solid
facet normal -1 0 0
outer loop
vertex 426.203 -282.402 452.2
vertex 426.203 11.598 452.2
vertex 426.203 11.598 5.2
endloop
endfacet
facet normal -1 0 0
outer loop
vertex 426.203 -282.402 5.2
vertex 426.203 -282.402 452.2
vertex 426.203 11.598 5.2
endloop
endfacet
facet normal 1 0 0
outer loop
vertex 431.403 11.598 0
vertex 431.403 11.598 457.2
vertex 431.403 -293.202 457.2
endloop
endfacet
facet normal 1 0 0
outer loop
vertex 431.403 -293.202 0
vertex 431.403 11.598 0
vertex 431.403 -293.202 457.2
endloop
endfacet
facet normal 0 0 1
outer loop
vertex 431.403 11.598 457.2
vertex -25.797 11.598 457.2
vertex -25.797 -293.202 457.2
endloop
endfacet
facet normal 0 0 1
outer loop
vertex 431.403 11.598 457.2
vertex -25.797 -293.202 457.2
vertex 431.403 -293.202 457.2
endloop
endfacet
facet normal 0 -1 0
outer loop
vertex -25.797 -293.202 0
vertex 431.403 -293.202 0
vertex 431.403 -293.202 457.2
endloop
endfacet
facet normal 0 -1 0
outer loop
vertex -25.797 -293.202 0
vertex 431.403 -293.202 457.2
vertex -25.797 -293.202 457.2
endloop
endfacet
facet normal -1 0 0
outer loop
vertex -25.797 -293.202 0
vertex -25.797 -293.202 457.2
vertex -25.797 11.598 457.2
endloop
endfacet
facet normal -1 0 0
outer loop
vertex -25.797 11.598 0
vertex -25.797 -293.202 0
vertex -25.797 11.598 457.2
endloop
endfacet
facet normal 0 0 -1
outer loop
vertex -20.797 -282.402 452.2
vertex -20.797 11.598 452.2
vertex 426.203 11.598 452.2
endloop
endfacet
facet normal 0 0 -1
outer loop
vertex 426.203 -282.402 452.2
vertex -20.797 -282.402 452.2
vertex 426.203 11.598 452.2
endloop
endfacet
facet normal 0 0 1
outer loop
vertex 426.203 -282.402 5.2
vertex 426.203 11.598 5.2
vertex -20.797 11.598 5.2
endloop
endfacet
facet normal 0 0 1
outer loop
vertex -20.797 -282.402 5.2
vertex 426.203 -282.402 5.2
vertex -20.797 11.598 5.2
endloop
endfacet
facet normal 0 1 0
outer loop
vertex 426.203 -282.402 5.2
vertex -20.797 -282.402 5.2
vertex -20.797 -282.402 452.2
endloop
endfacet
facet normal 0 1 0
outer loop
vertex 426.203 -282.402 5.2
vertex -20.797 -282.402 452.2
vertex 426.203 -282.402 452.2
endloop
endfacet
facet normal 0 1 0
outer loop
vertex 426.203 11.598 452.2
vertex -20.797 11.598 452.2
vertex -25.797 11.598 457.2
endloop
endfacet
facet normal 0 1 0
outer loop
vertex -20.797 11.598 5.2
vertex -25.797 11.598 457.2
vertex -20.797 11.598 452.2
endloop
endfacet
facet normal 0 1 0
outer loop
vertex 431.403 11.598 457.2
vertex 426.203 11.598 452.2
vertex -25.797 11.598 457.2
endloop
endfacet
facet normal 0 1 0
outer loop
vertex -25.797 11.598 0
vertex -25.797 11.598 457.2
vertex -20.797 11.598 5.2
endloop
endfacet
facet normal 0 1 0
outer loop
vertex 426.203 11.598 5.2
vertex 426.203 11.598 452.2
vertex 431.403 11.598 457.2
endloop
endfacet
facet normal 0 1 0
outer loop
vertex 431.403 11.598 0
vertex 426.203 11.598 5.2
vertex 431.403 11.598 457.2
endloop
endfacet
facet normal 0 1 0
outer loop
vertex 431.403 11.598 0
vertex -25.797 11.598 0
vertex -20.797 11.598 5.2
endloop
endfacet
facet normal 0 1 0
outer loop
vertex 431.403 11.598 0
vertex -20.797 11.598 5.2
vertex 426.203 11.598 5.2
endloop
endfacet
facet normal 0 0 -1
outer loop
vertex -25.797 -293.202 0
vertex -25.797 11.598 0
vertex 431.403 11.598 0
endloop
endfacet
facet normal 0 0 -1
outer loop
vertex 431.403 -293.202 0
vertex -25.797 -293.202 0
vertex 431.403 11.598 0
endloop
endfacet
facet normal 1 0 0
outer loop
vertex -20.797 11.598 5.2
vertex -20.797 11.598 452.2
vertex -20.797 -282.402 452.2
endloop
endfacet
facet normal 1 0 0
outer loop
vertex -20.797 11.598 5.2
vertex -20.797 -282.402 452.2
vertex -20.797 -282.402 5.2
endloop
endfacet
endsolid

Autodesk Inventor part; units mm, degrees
ref_plane "YZ Plane" through (0, 0, 0) normal (1, 0, 0) x (0, 1, 0)
ref_plane "XZ Plane" through (0, 0, 0) normal (0, 1, 0) x (-1, 0, 0)
ref_plane "XY Plane" through (0, 0, 0) normal (0, 0, 1) x (1, 0, 0)
sketch "Sketch1" plane through (0, 0, 0) normal (0, 0, 1) x (1, 0, 0)
  line L0 (-25.7967, 11.5978) -> (431.4033, 11.5978)
  line L1 (431.4033, 11.5978) -> (431.4033, -293.2022)
  line L2 (431.4033, -293.2022) -> (-25.7967, -293.2022)
  line L3 (-25.7967, -293.2022) -> (-25.7967, 11.5978)
  point P0 (0, 0)
  dimension "d0" = 457.2
  dimension "d1" = 304.8
extrude "Extrusion1" add sketch "Sketch1" along normal blind 457.2
sketch "Sketch2" plane through (-25.7967, 11.5978, 0) normal (0, 1, 0) x (1, 0, 0)
  line L0 (0, 0) -> (0, -457.2) projected
  line L1 (0, -457.2) -> (0, -452.2)
  line L2 (0, -457.2) -> (457.2, -457.2) projected
  line L3 (0, -457.2) -> (5, -457.2)
  line L4 (5, -452.2) -> (452, -452.2)
  line L5 (452, -452.2) -> (452, -5.2)
  line L6 (452, -5.2) -> (5, -5.2)
  line L7 (452, -5.2) -> (899, -5.2) construction
  line L8 (5, -452.2) -> (5, -5.2)
  point P0 (25.7967, 0)
  dimension "d4" = 5
  dimension "d5" = 5
  dimension "d6" = 447
  dimension "d7" = 447
  dimension "d8" = 447
  dimension "d9" = 180
extrude "Extrusion2" cut sketch "Sketch2" against normal blind 294
sketch "Sketch3" plane through (426.2033, 11.5978, 452.2) normal (0, 0, -1) x (-1, 0, 0)
  point P0 (426.2033, -11.5978)
properties part number "rectangle box" material "Glass"
